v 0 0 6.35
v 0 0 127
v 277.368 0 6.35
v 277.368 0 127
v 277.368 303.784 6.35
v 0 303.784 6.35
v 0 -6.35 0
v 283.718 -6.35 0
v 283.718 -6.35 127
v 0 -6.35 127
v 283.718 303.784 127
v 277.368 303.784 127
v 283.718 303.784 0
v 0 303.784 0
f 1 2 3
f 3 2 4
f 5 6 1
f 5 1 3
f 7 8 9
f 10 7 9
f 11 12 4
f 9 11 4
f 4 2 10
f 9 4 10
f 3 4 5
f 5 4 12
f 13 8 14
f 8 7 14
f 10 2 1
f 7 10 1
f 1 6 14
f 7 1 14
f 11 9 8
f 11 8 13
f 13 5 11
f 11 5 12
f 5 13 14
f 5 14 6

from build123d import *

# Parameters (mm, degrees)
F0_W     = 277.368
F0_H     = 303.784
F1_DEPTH = 6.35
F2_W     = 277.368
F2_H     = 127
F2_H_2   = 120.65
F3_DEPTH = 6.35
F4_W     = 310.134
F4_H     = 127
F5_DEPTH = 6.35


with BuildPart() as f1:
    # F0 (on Top) → F1 (new body)
    with BuildSketch(Plane.XY):
        with Locations((138.684, 151.892)):
            Rectangle(F0_W, F0_H)
    extrude(amount=F1_DEPTH)

    # F2 (on face) → F3 (join)
    with BuildSketch(Plane.XZ):
        with Locations((138.684, 63.5)):
            Rectangle(F2_W, F2_H)
        with Locations((138.684, 66.675)):
            Rectangle(F2_W, F2_H_2)
    extrude(amount=F3_DEPTH)

    # F4 (on face) → F5 (join)
    with BuildSketch(Plane.YZ.offset(277.368)):
        with Locations((148.717, 63.5)):
            Rectangle(F4_W, F4_H)
        Polygon((-6.35, 127), (-6.35, 0), (303.784, 0), (303.784, 6.35), (0, 6.35), (0, 127), align=None)
    extrude(amount=F5_DEPTH)


solid = f1.part
